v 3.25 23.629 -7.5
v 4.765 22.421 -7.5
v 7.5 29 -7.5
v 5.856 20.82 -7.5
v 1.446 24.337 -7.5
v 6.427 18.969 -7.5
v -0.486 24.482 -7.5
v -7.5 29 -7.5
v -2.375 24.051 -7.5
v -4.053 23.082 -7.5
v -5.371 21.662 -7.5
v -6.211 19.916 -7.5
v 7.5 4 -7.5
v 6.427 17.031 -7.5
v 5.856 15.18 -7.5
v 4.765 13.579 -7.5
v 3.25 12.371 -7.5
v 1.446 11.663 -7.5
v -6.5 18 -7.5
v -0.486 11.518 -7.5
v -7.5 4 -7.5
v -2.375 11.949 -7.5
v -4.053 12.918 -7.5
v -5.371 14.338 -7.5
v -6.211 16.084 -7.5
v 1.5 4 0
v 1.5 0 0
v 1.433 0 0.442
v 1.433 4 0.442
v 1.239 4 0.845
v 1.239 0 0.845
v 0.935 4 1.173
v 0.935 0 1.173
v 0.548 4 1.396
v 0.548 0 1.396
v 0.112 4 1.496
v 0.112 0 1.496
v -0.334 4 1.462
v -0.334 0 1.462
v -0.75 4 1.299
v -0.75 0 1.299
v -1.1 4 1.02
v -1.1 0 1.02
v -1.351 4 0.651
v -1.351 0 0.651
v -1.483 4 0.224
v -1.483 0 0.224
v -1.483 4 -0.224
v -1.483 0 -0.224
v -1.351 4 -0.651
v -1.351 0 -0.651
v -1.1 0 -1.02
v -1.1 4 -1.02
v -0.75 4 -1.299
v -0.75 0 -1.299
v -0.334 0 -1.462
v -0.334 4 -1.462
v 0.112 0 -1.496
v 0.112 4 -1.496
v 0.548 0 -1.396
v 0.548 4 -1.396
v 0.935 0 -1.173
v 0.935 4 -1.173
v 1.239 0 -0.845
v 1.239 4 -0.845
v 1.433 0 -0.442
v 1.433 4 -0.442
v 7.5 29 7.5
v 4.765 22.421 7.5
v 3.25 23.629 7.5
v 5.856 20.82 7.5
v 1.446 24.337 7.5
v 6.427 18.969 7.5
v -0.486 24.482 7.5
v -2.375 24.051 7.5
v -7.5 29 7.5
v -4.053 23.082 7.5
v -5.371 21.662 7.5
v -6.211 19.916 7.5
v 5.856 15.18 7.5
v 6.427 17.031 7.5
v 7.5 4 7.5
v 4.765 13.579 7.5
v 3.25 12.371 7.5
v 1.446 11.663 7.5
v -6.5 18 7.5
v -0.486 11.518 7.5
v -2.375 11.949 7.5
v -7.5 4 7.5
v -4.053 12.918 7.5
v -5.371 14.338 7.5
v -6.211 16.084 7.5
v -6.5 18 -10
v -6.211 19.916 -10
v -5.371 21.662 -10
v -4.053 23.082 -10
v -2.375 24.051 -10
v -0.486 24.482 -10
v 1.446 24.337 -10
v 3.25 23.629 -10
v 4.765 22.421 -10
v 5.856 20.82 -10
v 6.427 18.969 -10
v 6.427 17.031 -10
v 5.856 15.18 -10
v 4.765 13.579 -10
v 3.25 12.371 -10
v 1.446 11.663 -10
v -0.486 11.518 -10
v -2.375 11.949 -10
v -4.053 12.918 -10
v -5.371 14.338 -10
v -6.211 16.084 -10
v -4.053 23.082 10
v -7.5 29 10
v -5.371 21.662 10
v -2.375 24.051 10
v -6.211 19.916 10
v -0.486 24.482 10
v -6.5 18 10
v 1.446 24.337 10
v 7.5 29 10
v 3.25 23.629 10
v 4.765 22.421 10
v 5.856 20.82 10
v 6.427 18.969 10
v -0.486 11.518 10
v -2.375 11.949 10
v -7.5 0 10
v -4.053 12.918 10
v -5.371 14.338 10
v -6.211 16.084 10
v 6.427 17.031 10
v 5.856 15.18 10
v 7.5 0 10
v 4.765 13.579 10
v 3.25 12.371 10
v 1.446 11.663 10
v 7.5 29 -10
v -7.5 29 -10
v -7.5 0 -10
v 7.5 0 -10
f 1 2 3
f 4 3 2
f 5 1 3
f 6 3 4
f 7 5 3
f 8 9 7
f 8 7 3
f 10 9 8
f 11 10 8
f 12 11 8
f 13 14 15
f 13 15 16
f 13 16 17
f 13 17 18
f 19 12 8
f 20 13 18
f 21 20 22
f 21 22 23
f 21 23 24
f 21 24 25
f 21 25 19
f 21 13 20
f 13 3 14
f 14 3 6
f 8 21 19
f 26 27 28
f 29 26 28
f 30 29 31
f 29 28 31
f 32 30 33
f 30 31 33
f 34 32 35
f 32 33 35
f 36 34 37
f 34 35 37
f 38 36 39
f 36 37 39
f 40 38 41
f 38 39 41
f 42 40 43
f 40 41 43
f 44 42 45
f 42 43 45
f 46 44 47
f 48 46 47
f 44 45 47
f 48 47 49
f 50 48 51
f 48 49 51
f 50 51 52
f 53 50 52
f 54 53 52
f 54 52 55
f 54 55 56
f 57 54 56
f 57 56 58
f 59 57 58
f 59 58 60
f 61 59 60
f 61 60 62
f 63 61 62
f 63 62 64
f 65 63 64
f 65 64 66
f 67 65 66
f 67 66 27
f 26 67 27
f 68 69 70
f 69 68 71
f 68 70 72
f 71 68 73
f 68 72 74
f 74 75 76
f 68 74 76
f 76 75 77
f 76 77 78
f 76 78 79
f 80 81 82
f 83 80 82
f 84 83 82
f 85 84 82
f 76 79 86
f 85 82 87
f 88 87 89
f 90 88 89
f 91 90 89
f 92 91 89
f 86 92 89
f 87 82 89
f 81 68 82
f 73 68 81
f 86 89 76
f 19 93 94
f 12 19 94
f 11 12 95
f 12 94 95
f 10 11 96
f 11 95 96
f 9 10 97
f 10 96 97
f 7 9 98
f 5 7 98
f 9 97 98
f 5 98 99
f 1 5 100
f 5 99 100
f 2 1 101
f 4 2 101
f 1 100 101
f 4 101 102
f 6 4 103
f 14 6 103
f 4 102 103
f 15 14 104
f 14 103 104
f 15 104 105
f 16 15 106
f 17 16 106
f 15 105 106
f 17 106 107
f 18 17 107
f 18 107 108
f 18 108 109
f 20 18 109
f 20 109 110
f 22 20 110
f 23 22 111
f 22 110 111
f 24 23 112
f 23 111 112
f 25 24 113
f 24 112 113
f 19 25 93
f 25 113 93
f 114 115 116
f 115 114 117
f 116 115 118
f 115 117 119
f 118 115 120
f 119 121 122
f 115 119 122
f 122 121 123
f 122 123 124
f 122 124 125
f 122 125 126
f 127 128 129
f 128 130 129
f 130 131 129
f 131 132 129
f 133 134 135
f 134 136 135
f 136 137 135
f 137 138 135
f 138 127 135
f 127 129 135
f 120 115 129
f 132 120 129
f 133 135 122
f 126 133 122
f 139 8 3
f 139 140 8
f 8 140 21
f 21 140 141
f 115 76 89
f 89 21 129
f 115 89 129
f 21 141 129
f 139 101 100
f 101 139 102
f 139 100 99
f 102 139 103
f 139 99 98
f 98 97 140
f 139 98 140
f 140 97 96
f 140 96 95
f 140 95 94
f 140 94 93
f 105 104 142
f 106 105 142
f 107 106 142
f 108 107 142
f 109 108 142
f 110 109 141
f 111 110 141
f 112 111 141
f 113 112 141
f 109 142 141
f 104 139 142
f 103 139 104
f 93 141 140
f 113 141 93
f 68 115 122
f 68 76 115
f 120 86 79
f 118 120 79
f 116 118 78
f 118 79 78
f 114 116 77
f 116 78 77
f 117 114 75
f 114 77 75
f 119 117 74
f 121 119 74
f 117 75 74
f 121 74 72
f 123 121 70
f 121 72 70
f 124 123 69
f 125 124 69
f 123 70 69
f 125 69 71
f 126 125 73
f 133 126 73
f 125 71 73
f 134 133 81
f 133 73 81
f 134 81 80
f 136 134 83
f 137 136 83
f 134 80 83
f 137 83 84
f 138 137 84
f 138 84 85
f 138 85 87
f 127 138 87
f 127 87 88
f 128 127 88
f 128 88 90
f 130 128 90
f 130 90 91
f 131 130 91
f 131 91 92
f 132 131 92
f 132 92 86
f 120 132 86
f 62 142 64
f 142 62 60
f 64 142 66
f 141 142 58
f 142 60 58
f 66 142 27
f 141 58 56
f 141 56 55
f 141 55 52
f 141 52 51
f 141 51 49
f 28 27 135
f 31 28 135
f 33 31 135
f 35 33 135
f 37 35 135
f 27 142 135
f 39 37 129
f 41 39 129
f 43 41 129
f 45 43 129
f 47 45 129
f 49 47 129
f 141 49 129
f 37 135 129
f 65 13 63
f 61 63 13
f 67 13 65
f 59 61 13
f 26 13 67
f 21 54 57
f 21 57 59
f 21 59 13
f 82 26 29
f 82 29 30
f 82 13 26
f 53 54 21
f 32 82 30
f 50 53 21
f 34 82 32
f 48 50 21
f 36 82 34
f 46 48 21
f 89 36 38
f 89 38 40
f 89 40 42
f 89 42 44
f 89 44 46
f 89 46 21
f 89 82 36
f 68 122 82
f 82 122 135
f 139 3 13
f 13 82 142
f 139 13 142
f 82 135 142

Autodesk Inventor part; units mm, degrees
ref_plane "YZ Plane" through (0, 0, 0) normal (1, 0, 0) x (0, 1, 0)
ref_plane "XZ Plane" through (0, 0, 0) normal (0, 1, 0) x (-1, 0, 0)
ref_plane "XY Plane" through (0, 0, 0) normal (0, 0, 1) x (1, 0, 0)
sketch "Sketch1" plane through (0, 0, 0) normal (0, 1, 0) x (-1, 0, 0)
  line L0 (-7.5, -10) -> (7.5, -10)
  line L1 (7.5, -10) -> (7.5, 10)
  line L2 (7.5, 10) -> (-7.5, 10)
  line L3 (-7.5, 10) -> (-7.5, -10)
  line L4 (-7.5, -10) -> (7.5, 10) construction
  line L5 (7.5, -10) -> (-7.5, 10) construction
  point P0 (0, 0)
  dimension "d0" = 15
  dimension "d1" = 20
extrude "Extrusion1" add sketch "Sketch1" along normal blind 4
sketch "Sketch2" plane through (0, 4, 0) normal (0, 1, 0) x (1, 0, 0)
  line L0 (-7.5, 10) -> (-7.5, -10) projected
  line L1 (7.5, -10) -> (7.5, 10) projected
  line L2 (-7.5, 10) -> (7.5, 10)
  line L3 (7.5, 10) -> (7.5, 7.5)
  line L4 (7.5, 7.5) -> (-7.5, 7.5)
  line L5 (-7.5, 7.5) -> (-7.5, 10)
  line L6 (7.5, 0) -> (0, 0) construction
  line L7 (-7.5, -10) -> (-7.5, 10)
  line L8 (7.5, 10) -> (7.5, -10)
  line L9 (-7.5, -10) -> (7.5, -10)
  line L10 (7.5, -7.5) -> (-7.5, -7.5)
  dimension "d4" = 2.5
extrude "Extrusion2" add sketch "Sketch2" along normal blind 25 contours L2 L1 L4 L0 | L10 L1 L9 L0
sketch "Sketch4" plane through (7.5, 0, -10) normal (0, 0, -1) x (-1, 0, 0)
  line L0 (7.5, 0) -> (7.5, 7) construction
  line L1 (0, 0) -> (0, 29) construction
  line L2 (15, 4) -> (15, 29) construction
  line L3 (0, 4) -> (0, 29) construction
  line L4 (15, 7) -> (0, 7) construction
  line L5 (0, 29) -> (15, 29) construction
  line L6 (15, 29) -> (0, 7) construction
  line L7 (0, 29) -> (15, 7) construction
  circle A0 centre (7.5, 18) radius 6.5
  dimension "d12" = 7
  dimension "d13" = 13
  dimension "d14" = 34.287
extrude "Extrusion4" cut sketch "Sketch4" against normal blind 25
sketch "Sketch5" plane through (0, 0, 0) normal (0, -1, 0) x (1, 0, 0)
  line L0 (-7.5, 10) -> (7.5, 10) construction
  line L1 (-7.5, 10) -> (7.5, -10) construction
  line L2 (7.5, 10) -> (-7.5, -10) construction
  circle A0 centre (0, 0) radius 1.5
  dimension "d17" = 3
extrude "Extrusion5" cut sketch "Sketch5" against normal blind 5
properties part number "llanta_1"
